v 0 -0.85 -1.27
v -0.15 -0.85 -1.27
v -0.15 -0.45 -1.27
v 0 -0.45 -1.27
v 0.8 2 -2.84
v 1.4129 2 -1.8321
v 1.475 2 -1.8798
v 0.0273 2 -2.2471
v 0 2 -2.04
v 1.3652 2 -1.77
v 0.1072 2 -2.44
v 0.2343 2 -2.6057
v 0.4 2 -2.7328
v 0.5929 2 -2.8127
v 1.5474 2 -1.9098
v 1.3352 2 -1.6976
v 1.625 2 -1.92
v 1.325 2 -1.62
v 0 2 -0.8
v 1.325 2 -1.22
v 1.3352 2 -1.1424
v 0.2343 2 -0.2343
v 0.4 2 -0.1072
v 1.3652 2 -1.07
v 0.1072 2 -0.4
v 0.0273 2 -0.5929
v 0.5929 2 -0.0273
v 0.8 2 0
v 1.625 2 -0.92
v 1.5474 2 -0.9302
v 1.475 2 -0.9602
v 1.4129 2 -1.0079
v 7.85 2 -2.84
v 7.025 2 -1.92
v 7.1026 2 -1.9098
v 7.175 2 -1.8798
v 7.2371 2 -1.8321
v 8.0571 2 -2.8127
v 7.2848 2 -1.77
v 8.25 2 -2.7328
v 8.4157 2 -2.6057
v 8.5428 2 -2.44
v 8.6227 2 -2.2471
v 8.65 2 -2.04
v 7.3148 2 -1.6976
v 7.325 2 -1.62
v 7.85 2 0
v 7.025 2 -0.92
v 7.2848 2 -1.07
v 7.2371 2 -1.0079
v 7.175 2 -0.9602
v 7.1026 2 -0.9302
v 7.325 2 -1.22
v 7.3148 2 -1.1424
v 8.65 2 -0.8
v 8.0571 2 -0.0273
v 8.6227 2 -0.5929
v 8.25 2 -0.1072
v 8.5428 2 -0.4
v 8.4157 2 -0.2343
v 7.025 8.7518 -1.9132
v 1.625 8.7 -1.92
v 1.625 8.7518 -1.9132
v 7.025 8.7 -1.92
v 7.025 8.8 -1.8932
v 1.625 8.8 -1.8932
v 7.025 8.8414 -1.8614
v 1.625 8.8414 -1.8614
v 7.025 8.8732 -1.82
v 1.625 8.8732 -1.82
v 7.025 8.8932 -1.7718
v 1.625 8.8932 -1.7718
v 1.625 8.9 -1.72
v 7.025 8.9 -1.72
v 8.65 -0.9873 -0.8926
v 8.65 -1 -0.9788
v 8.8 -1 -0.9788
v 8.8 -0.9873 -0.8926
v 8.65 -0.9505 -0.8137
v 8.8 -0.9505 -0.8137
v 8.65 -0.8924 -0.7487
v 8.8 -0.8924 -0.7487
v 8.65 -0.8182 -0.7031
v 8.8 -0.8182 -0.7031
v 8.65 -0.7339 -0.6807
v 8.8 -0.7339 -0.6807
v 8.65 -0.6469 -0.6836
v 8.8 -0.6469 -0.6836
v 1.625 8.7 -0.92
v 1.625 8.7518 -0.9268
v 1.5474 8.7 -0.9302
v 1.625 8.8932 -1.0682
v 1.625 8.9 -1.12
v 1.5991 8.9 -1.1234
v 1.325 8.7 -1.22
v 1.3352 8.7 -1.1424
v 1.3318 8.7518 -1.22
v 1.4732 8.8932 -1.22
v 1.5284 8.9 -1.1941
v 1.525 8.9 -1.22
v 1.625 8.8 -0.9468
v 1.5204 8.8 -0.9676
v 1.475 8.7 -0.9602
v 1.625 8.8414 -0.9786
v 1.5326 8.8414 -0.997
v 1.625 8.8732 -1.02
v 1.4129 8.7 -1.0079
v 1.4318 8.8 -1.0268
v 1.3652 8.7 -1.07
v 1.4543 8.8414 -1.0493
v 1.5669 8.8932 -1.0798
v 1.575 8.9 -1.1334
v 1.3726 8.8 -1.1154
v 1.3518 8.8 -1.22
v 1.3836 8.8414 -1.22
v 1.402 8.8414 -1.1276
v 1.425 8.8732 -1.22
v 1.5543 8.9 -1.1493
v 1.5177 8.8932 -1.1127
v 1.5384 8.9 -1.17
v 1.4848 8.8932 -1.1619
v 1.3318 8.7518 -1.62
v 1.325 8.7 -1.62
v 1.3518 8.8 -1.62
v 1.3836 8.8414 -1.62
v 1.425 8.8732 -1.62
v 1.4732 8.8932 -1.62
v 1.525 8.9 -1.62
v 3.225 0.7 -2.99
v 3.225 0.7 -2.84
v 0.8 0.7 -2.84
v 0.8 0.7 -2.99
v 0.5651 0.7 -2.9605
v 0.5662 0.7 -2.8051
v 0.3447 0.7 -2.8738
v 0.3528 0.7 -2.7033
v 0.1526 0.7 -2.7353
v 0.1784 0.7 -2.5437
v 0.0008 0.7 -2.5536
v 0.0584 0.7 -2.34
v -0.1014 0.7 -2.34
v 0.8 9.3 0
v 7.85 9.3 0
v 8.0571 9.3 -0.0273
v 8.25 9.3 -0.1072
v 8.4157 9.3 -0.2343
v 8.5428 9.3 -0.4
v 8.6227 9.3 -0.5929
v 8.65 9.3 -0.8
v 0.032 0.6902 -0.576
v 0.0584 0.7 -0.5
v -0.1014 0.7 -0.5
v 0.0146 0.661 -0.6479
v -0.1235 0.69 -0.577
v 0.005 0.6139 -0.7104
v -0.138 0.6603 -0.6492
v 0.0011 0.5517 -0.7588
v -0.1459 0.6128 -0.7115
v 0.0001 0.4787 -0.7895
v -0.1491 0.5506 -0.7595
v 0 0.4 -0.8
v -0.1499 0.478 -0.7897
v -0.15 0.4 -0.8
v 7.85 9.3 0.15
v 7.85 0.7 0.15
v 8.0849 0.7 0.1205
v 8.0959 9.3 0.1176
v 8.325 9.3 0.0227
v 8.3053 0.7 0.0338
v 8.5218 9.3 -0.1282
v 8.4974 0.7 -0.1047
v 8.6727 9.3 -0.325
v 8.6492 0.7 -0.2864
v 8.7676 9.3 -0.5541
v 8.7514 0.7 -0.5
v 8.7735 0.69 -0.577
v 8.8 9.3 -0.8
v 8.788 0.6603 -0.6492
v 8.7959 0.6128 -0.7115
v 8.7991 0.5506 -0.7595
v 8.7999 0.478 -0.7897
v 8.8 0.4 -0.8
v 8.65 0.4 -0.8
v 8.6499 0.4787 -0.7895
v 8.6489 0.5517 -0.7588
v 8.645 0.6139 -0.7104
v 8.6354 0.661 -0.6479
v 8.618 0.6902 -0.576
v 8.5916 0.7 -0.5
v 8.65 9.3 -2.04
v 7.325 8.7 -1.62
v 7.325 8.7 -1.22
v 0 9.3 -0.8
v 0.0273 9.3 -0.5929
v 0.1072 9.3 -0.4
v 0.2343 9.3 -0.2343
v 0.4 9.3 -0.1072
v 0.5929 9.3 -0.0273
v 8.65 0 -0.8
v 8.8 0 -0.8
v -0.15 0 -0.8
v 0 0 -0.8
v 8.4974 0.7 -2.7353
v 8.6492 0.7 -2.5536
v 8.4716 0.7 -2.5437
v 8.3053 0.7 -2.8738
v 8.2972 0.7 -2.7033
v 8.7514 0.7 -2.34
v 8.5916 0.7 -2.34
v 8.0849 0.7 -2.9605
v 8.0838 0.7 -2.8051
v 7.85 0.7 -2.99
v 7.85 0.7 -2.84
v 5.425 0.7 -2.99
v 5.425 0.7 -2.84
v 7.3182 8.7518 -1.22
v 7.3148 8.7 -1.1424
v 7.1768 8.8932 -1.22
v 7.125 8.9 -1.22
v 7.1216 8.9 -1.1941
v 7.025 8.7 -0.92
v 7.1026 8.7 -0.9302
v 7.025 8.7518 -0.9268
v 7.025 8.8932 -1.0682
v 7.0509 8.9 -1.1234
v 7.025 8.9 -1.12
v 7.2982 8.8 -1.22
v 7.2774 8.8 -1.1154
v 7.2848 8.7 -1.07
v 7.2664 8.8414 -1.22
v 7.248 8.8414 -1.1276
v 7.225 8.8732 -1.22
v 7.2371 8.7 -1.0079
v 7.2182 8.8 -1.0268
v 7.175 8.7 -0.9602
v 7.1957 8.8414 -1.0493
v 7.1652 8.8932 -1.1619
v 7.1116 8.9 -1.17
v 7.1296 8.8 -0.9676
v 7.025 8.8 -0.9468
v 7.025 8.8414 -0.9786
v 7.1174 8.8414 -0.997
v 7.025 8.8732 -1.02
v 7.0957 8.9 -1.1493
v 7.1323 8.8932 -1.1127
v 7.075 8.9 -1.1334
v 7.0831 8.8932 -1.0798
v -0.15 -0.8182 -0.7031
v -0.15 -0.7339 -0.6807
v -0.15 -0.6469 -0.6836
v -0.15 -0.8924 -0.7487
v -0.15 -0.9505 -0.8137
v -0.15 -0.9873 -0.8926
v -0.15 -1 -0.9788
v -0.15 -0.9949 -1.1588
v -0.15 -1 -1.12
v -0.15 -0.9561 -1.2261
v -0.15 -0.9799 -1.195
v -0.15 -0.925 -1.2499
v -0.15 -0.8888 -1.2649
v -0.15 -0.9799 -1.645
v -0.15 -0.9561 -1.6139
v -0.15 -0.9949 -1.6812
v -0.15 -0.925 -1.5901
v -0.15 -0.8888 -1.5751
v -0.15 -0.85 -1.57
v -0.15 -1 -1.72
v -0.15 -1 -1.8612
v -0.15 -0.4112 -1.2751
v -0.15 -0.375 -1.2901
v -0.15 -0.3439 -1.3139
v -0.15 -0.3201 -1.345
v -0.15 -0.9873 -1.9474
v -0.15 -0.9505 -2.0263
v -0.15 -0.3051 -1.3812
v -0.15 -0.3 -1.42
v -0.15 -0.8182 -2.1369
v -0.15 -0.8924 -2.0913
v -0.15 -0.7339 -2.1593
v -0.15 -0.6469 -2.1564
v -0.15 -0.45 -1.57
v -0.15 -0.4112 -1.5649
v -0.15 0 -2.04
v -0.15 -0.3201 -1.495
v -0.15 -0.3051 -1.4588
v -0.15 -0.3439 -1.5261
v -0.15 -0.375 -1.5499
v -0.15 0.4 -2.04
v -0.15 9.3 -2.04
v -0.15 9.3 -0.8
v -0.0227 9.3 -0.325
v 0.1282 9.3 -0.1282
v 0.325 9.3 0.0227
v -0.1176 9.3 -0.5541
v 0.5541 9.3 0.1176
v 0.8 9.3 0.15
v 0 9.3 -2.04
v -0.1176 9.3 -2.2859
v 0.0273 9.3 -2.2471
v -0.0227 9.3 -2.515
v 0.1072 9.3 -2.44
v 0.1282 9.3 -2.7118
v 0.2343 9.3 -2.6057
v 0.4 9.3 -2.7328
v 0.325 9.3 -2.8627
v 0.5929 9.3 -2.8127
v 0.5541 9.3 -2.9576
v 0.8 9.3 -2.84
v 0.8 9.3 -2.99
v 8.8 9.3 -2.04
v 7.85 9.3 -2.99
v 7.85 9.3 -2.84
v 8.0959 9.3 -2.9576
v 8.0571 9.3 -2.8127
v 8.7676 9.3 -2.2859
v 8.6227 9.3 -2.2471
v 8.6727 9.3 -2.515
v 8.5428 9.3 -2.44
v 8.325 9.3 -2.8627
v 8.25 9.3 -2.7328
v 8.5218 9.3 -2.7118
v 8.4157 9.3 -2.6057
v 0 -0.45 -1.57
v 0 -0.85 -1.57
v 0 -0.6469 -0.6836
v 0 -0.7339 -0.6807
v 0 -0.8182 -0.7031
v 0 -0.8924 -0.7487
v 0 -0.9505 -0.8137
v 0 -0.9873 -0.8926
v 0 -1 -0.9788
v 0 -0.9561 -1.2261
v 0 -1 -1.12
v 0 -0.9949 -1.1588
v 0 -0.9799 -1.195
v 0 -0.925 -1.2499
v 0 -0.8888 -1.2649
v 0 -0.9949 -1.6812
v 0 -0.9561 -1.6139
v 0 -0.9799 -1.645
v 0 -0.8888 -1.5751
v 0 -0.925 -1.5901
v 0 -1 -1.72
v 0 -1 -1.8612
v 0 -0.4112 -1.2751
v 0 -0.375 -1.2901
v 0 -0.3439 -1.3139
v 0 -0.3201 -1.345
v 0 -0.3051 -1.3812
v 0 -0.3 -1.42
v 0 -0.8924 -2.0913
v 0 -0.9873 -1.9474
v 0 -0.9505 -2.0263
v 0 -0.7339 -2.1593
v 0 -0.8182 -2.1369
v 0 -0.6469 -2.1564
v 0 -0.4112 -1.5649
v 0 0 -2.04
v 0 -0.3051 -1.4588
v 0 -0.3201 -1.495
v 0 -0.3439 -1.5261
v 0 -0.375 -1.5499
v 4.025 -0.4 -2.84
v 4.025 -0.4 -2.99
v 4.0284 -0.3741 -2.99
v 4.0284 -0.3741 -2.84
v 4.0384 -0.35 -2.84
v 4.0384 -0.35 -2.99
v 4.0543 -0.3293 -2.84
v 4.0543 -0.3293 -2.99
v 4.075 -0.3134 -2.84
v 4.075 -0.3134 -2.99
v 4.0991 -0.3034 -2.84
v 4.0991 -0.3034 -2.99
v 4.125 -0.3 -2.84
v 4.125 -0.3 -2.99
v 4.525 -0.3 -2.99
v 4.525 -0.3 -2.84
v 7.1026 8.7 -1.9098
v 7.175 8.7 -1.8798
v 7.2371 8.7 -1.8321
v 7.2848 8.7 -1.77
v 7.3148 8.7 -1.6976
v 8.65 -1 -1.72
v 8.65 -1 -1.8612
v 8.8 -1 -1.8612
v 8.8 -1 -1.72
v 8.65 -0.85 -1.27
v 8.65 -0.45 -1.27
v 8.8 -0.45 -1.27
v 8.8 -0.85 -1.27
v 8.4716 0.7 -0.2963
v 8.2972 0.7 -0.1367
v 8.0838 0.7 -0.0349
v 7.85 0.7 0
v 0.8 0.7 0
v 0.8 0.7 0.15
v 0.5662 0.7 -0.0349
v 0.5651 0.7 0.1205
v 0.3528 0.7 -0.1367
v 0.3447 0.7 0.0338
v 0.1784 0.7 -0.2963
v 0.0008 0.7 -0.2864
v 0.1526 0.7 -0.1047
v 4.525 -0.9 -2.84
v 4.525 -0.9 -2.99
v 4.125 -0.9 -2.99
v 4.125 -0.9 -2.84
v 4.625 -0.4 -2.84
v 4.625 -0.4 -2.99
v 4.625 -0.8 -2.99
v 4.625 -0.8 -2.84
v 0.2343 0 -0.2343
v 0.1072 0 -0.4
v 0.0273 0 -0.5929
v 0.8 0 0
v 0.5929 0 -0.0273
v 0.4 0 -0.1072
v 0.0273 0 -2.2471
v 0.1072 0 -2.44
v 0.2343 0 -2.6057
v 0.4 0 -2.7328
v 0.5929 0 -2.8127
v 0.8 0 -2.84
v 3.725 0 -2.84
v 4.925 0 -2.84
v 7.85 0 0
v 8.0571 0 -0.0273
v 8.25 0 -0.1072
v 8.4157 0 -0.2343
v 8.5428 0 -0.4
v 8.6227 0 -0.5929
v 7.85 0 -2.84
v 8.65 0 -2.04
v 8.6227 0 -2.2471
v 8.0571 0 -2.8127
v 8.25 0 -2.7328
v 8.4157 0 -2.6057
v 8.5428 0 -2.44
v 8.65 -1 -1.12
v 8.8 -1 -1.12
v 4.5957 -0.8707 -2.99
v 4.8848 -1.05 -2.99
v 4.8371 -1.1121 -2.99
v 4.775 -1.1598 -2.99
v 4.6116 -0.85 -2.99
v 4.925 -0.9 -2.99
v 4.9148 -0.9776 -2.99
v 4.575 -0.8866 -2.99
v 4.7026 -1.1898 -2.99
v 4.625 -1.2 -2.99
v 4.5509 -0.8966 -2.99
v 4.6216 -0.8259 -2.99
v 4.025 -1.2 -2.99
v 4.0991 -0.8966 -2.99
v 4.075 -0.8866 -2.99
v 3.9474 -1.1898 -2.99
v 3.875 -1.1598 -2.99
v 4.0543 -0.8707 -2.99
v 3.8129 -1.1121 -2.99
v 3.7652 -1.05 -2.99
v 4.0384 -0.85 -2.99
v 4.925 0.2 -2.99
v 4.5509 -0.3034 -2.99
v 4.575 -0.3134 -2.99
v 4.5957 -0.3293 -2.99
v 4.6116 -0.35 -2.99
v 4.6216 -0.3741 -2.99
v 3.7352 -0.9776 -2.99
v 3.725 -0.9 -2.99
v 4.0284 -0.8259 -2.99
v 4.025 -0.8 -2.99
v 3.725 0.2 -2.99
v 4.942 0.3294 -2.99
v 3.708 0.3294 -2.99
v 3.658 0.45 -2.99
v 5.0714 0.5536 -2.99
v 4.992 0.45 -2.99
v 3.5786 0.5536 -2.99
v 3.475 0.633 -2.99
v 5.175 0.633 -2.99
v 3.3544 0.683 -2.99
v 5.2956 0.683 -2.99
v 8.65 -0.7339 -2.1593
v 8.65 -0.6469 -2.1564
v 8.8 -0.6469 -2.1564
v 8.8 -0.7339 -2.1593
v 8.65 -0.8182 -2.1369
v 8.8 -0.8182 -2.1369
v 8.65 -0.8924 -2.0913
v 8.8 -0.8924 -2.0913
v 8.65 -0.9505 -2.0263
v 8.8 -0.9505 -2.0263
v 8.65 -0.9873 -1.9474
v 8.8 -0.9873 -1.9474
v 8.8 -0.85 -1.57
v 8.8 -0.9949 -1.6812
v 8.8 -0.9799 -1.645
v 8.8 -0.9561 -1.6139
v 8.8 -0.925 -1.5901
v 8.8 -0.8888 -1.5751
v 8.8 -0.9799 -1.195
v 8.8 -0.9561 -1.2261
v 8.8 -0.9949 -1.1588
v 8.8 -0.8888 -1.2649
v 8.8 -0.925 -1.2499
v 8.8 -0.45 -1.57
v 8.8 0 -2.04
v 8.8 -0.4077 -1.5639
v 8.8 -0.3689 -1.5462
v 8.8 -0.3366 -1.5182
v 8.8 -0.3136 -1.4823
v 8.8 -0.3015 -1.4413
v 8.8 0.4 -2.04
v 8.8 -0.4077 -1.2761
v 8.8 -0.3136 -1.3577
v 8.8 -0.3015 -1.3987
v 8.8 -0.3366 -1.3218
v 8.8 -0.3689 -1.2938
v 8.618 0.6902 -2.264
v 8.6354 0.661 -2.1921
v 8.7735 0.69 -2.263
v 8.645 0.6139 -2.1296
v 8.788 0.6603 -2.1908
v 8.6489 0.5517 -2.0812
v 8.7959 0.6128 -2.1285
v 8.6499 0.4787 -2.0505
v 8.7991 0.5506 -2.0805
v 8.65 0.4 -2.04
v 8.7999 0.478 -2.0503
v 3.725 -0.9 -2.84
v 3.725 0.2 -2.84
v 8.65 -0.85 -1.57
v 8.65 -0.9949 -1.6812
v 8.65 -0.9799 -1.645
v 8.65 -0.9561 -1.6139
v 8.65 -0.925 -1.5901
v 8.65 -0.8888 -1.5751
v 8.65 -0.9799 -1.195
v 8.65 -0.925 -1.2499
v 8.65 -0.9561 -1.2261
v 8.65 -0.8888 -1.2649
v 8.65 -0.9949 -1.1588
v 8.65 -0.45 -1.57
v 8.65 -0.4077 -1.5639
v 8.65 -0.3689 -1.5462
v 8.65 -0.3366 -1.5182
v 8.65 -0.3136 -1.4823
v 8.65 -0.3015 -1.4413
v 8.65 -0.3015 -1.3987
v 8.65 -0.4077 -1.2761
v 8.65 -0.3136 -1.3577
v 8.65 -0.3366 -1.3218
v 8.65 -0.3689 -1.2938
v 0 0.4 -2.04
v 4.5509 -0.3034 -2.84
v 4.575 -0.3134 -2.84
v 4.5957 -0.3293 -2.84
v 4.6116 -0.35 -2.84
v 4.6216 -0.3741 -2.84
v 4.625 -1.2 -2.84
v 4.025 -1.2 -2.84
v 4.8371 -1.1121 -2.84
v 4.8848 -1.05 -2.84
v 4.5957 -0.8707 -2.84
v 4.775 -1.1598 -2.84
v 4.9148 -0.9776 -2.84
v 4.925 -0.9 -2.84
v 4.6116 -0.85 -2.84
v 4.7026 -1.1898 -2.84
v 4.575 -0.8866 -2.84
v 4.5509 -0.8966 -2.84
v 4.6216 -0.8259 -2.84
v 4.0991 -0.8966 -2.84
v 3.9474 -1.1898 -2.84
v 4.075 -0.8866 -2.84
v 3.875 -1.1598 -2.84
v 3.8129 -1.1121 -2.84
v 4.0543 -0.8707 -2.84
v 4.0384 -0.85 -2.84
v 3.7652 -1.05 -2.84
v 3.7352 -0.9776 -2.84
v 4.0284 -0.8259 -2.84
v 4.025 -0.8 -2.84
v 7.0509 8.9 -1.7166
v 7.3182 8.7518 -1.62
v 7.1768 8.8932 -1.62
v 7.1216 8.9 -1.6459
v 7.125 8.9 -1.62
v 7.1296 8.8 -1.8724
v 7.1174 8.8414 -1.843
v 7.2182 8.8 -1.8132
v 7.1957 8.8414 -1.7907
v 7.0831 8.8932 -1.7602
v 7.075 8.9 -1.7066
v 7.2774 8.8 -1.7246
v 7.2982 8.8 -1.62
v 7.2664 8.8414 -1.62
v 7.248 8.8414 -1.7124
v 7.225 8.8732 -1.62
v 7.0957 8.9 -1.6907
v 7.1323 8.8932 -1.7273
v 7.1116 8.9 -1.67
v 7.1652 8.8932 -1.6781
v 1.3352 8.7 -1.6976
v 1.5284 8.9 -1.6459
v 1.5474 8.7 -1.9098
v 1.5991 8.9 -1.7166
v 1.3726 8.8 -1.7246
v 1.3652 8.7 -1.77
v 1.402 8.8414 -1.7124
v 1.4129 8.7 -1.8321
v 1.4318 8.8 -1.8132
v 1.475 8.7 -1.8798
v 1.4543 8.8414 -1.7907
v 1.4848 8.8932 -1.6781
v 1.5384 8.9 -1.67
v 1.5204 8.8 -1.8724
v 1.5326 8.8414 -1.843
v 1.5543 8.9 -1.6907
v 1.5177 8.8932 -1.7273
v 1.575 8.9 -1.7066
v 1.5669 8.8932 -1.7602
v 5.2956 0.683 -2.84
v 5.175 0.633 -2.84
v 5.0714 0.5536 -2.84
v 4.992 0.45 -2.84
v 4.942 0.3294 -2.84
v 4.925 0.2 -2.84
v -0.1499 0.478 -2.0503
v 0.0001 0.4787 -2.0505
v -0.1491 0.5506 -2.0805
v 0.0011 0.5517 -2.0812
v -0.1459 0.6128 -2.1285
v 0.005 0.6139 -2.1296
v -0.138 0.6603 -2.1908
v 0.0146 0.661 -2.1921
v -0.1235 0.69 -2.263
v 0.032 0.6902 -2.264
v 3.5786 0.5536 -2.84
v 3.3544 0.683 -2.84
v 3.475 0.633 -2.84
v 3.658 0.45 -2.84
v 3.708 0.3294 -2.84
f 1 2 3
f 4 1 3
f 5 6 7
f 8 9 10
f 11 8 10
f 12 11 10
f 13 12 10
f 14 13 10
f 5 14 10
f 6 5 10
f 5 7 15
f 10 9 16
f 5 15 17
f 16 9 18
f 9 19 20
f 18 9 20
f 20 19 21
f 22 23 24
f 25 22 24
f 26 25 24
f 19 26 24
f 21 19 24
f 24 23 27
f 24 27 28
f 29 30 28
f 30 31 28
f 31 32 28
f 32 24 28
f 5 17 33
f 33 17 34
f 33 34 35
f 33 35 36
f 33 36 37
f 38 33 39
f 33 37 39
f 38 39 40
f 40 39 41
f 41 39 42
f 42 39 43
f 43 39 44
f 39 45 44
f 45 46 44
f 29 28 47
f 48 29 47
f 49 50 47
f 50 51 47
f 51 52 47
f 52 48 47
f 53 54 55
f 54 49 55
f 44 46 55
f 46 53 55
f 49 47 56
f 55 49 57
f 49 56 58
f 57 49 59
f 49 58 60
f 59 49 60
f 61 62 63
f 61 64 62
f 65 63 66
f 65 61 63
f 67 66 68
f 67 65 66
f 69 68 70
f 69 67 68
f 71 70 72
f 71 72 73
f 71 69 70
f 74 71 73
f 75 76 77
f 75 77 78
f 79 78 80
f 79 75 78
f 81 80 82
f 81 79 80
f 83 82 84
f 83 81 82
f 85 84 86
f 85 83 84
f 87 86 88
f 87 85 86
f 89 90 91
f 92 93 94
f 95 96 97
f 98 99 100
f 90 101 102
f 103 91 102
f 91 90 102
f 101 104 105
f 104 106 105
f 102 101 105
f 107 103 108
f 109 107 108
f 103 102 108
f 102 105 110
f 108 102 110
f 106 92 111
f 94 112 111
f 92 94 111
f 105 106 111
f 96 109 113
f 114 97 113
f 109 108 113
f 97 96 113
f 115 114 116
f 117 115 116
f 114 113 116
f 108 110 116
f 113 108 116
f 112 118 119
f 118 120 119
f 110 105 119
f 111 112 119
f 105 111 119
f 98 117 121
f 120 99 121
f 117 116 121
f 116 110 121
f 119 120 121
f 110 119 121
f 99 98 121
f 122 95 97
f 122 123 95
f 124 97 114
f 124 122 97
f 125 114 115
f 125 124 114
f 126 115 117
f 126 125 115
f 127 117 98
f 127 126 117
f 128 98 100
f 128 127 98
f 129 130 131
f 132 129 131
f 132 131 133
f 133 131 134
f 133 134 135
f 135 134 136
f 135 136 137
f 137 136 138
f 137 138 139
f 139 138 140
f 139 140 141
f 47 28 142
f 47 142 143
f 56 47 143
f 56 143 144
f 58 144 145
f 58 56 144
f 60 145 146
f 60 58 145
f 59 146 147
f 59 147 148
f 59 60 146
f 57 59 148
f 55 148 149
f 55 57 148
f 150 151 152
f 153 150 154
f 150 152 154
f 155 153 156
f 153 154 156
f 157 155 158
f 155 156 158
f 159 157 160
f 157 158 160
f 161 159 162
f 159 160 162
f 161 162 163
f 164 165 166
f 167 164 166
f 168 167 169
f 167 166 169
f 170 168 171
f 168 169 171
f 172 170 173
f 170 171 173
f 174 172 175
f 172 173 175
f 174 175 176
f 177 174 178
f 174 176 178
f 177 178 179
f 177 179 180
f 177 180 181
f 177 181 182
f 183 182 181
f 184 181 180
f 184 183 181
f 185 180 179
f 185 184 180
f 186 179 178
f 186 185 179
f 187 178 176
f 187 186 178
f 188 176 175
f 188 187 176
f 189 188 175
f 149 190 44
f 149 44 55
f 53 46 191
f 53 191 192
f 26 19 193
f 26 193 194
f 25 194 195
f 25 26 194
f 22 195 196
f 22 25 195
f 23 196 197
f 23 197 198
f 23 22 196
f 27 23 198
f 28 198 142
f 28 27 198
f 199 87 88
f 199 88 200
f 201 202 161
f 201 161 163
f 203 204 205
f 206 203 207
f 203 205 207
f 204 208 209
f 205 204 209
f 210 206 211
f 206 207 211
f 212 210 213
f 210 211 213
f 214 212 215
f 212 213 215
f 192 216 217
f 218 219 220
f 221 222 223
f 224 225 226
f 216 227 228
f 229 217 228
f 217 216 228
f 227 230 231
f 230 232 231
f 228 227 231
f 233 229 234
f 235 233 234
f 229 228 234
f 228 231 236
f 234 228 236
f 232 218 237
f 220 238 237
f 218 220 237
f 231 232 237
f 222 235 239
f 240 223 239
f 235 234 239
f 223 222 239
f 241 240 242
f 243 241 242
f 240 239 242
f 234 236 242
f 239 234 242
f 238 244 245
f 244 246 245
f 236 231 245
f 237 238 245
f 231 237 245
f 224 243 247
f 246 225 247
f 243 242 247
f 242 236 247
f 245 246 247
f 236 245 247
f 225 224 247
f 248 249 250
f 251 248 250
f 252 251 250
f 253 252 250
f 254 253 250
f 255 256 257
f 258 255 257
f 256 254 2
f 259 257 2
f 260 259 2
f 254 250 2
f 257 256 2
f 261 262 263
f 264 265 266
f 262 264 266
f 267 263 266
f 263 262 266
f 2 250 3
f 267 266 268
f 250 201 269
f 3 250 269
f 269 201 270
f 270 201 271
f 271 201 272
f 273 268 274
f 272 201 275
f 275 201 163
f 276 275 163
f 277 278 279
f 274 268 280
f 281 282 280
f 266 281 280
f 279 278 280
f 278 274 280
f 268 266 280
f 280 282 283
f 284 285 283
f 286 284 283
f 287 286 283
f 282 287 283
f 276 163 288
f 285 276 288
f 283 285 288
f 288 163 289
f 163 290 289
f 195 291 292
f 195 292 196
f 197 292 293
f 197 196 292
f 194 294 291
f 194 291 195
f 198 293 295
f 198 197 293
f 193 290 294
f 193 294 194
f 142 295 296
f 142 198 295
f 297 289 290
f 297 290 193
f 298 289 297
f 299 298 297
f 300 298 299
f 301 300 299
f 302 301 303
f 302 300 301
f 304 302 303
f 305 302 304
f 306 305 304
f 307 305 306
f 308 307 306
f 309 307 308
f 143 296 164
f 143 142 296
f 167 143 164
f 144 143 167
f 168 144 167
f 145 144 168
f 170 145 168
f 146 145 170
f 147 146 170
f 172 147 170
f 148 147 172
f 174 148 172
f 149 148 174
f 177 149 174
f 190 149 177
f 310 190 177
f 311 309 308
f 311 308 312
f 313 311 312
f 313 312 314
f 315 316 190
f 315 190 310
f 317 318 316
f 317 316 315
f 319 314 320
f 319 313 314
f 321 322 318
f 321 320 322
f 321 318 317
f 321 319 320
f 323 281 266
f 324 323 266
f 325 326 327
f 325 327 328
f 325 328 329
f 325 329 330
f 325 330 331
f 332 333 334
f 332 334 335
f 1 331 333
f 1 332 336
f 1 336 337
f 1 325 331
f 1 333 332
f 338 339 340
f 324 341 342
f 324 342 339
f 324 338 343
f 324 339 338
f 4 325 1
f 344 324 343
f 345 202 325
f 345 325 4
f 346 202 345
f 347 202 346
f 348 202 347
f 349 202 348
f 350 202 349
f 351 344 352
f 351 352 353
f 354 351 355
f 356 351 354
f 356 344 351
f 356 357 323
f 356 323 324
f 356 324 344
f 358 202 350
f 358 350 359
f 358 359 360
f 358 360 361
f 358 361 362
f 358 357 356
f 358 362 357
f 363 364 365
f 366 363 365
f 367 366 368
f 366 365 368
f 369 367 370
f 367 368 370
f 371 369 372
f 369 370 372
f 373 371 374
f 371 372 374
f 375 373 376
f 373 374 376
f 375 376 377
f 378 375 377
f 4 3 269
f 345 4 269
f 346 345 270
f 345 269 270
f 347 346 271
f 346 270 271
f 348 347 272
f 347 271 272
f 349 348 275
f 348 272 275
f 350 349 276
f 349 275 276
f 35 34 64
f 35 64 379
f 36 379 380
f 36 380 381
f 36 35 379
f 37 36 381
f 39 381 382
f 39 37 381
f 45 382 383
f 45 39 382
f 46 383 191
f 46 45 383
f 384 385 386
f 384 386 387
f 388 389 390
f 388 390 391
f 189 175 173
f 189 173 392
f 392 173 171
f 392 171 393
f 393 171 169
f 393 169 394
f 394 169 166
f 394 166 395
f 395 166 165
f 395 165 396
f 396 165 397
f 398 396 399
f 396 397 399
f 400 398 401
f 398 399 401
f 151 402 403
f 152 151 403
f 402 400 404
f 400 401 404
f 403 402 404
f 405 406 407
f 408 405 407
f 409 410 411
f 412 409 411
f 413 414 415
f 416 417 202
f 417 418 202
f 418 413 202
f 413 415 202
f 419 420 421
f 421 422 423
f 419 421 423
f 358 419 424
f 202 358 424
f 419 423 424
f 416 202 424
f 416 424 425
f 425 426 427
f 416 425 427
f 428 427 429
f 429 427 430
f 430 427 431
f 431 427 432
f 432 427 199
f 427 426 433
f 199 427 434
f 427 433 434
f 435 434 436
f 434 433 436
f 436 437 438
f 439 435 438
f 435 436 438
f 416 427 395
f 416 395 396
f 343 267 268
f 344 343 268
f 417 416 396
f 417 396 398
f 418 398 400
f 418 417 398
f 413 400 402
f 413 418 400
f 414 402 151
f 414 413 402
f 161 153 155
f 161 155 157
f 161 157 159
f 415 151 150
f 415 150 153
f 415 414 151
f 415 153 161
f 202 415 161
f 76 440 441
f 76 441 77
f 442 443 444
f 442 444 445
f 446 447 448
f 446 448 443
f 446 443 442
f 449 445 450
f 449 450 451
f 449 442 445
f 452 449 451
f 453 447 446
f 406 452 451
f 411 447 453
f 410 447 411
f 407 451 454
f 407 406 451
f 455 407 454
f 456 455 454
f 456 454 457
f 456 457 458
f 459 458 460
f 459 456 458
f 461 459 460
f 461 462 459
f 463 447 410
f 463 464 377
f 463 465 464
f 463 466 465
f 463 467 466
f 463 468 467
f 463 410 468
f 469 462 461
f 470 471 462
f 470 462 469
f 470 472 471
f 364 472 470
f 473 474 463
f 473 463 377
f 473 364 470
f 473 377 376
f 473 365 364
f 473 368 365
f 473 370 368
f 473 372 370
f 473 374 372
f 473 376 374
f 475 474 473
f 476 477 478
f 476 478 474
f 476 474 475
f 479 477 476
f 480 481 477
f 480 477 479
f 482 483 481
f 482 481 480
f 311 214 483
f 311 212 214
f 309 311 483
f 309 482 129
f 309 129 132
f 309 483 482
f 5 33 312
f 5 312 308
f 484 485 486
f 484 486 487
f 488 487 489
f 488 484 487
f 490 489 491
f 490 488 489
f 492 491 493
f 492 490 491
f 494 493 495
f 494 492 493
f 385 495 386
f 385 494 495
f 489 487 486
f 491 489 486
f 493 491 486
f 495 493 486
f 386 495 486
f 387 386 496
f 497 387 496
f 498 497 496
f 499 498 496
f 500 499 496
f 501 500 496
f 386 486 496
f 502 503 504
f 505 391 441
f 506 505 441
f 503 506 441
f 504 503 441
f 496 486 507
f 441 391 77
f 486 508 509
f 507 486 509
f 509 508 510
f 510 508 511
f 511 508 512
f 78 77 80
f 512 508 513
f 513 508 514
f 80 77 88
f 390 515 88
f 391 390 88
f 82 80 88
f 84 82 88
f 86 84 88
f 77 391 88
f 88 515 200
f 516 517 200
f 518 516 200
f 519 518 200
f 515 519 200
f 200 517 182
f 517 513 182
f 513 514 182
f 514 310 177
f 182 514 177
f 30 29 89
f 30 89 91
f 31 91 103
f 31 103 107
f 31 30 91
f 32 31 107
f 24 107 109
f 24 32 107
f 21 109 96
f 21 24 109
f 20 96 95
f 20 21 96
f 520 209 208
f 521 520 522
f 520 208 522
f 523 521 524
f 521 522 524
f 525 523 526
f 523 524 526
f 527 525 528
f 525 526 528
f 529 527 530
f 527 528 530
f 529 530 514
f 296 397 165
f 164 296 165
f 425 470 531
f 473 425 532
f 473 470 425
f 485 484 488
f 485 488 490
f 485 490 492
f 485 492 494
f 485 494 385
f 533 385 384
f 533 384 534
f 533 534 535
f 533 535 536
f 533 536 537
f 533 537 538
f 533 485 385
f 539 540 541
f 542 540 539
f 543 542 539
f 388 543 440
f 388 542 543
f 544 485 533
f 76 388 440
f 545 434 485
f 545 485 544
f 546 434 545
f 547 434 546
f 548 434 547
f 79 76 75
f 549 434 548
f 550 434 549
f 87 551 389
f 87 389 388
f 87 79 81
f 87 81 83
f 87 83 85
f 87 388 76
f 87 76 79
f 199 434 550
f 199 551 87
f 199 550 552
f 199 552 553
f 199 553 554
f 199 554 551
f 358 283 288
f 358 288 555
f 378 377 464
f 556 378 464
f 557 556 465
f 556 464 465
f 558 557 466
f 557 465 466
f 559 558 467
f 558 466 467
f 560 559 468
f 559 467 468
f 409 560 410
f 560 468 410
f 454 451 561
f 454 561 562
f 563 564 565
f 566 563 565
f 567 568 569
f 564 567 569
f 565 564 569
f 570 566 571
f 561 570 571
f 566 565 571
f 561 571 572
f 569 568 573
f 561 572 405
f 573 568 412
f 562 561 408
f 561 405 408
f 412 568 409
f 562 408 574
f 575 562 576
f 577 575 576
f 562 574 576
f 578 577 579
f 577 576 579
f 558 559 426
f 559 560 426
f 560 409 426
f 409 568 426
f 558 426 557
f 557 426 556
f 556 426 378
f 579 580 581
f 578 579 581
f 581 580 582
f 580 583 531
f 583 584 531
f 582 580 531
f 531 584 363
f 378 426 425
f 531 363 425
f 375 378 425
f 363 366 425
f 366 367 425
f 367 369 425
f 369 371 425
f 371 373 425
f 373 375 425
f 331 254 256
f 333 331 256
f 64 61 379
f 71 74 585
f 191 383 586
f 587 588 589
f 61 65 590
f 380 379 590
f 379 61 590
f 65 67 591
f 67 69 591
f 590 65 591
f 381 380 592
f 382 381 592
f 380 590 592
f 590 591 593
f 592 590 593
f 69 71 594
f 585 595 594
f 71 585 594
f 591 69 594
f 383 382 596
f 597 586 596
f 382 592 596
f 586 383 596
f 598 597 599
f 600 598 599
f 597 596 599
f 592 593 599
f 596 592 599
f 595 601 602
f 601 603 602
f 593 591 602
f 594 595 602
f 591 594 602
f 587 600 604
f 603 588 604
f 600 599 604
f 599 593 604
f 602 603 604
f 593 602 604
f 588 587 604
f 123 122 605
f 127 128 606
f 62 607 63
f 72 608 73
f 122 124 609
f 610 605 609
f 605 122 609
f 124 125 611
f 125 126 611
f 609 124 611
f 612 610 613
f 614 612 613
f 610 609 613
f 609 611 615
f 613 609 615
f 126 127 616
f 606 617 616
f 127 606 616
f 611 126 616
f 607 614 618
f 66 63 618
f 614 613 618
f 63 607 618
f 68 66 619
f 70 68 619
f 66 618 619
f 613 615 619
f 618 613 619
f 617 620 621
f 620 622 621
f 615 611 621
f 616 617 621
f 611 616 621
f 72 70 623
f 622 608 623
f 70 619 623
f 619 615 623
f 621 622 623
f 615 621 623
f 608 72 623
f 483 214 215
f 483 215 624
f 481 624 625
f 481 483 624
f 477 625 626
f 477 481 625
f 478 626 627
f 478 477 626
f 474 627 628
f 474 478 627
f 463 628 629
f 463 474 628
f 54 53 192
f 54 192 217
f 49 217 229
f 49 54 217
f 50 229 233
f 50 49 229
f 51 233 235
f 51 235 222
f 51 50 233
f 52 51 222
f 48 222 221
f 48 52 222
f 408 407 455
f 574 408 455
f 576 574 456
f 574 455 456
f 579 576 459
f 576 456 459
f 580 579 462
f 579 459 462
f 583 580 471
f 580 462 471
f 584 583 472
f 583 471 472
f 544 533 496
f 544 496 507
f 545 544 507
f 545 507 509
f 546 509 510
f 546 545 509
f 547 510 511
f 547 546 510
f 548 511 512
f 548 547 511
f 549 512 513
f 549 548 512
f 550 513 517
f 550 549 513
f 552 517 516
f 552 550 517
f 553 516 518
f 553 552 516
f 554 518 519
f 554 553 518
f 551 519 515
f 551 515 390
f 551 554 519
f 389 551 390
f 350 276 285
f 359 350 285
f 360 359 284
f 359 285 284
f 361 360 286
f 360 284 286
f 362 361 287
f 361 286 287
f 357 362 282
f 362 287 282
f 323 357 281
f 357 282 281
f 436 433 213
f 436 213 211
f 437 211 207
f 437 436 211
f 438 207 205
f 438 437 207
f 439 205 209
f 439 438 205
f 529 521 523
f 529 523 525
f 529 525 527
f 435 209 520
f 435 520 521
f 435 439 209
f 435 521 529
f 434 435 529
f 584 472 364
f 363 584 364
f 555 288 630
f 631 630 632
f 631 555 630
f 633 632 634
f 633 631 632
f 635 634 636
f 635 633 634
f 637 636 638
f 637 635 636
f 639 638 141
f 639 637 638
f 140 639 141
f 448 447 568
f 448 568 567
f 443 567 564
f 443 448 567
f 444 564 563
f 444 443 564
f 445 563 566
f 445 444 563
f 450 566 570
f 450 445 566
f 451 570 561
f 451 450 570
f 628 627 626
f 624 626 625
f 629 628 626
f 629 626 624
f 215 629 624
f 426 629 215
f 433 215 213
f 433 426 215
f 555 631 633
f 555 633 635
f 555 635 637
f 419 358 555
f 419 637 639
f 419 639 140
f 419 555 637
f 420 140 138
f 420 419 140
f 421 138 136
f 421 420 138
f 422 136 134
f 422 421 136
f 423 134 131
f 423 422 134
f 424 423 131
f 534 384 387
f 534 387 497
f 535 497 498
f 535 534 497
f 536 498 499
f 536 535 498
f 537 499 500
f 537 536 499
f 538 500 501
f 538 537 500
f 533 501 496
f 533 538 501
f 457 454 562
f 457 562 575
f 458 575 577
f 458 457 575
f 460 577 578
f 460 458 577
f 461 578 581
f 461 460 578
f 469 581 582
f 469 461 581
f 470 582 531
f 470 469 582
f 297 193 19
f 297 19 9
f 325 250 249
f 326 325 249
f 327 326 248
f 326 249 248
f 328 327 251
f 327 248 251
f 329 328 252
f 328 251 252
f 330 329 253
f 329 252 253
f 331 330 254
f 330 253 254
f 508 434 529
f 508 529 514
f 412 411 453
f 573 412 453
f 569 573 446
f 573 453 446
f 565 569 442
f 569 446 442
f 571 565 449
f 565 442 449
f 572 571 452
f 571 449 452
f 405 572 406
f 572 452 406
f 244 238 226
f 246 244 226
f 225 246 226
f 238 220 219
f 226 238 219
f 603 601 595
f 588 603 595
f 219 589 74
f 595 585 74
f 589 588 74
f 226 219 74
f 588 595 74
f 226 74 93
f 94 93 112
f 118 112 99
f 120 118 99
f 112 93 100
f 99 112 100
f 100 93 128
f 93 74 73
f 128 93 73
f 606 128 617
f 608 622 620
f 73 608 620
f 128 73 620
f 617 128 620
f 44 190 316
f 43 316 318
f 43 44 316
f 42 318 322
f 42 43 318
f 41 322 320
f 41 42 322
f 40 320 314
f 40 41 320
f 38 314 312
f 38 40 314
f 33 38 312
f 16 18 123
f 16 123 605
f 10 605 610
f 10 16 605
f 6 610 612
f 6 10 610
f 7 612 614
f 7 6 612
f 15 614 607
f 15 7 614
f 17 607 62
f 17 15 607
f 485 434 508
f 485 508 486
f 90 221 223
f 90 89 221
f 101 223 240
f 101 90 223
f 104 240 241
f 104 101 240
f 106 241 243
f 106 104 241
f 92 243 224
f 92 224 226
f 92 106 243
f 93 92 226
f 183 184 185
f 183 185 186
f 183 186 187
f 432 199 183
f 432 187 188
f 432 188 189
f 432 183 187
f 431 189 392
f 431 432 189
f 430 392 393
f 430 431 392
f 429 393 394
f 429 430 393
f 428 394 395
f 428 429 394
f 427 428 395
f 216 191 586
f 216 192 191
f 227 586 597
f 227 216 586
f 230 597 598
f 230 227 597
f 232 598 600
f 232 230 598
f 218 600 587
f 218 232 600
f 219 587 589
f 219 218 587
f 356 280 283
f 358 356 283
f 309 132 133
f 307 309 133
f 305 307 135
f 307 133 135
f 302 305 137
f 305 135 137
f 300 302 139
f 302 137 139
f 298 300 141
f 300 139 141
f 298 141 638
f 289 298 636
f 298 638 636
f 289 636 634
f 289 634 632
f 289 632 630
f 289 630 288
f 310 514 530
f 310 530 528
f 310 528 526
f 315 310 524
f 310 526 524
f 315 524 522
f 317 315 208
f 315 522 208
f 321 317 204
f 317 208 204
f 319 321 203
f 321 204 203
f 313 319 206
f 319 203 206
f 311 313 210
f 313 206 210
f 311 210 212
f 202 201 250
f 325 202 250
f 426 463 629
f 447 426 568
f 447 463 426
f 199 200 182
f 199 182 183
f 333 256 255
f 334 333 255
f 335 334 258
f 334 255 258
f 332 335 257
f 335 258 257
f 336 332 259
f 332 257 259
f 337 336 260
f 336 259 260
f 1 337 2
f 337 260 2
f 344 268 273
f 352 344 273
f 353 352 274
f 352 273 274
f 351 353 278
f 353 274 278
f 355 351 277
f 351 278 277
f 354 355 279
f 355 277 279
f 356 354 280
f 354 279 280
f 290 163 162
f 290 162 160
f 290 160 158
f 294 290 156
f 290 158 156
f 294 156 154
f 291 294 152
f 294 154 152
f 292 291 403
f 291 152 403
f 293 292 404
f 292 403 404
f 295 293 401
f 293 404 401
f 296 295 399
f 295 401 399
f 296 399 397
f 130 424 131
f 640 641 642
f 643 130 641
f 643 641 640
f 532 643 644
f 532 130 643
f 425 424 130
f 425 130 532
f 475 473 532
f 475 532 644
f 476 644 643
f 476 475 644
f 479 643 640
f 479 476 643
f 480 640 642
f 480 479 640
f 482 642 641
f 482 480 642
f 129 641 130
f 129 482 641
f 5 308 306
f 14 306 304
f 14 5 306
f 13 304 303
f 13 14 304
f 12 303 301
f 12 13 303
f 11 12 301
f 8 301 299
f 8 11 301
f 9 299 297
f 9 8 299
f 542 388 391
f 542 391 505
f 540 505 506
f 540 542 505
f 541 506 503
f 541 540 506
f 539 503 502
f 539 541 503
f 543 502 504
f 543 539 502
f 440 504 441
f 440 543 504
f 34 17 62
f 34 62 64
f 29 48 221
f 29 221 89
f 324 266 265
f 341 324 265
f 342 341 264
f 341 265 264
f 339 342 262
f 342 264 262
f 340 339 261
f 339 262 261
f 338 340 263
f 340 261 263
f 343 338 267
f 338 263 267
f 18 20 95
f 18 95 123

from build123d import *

# Parameters (mm, degrees)
EXTRUDE_1_DEPTH     = 9.3
EXTRUDE_2_DEPTH     = 0.15
EXTRUDE_START       = -0.15
EXTRUDE_3_DEPTH     = 0.15
EXTRUDE_4_DEPTH     = 2
CUT_EXTRUDE_1_DEPTH = 0.7
FILLET_1_R          = 0.3
EXTRUDE_5_DEPTH     = 0.15
CUT_EXTRUDE_2_DEPTH = 0.15
EXTRUDE_6_DEPTH     = 6.9
FILLET_2_R          = 0.2


with BuildPart() as part:
    # 草图1 → 凸台-拉伸1 (new body)
    with BuildSketch(Plane(origin=(0, 0, 0), x_dir=(1, 0, 0), z_dir=(0, 1, 0))):
        with BuildLine():
            Line((0.8, -0.15), (7.85, -0.15))
            ThreePointArc((7.85, -0.15), (8.521751442, 0.128248558), (8.8, 0.8))
            Line((8.8, 0.8), (8.8, 2.04))
            ThreePointArc((8.8, 2.04), (8.521751442, 2.711751442), (7.85, 2.99))
            Line((7.85, 2.99), (0.8, 2.99))
            ThreePointArc((0.8, 2.99), (0.128248558, 2.711751442), (-0.15, 2.04))
            Line((-0.15, 2.04), (-0.15, 0.8))
            ThreePointArc((-0.15, 0.8), (0.128248558, 0.128248558), (0.8, -0.15))
        make_face()
        with BuildLine():
            Line((0.8, 0), (7.85, 0))
            ThreePointArc((7.85, 0), (8.415685425, 0.234314575), (8.65, 0.8))
            Line((8.65, 0.8), (8.65, 2.04))
            ThreePointArc((8.65, 2.04), (8.415685425, 2.605685425), (7.85, 2.84))
            Line((7.85, 2.84), (0.8, 2.84))
            ThreePointArc((0.8, 2.84), (0.234314575, 2.605685425), (0, 2.04))
            Line((0, 2.04), (0, 0.8))
            ThreePointArc((0, 0.8), (0.234314575, 0.234314575), (0.8, 0))
        make_face(mode=Mode.SUBTRACT)
    extrude(amount=EXTRUDE_1_DEPTH)

    # 草图3 → 凸台-拉伸2 (add)
    with BuildSketch(Plane.ZY.offset(0.15)):
        with BuildLine():
            Line((-2.04, 0), (-0.8, 0))
            Line((-0.8, 0), (-0.683566262, -0.646854101))
            ThreePointArc((-0.683566262, -0.646854101), (-0.748665041, -0.892426908), (-0.978821259, -1))
            Line((-0.978821259, -1), (-1.12, -1))
            ThreePointArc((-1.12, -1), (-1.226066017, -0.956066017), (-1.27, -0.85))
            Line((-1.27, -0.85), (-1.27, -0.45))
            ThreePointArc((-1.27, -0.45), (-1.313933983, -0.343933983), (-1.42, -0.3))
            ThreePointArc((-1.42, -0.3), (-1.526066017, -0.343933983), (-1.57, -0.45))
            Line((-1.57, -0.45), (-1.57, -0.85))
            ThreePointArc((-1.57, -0.85), (-1.613933983, -0.956066017), (-1.72, -1))
            Line((-1.72, -1), (-1.861178741, -1))
            ThreePointArc((-1.861178741, -1), (-2.091334959, -0.892426908), (-2.156433738, -0.646854101))
            Line((-2.156433738, -0.646854101), (-2.04, 0))
        make_face()
    extrude(amount=-EXTRUDE_2_DEPTH)

    # 草图4 → 凸台-拉伸3 (add)
    with BuildSketch(Plane(origin=(8.8, 0, 0), x_dir=(0, 0, -1), z_dir=(1, 0, 0)).offset(EXTRUDE_START)):
        with BuildLine():
            Line((0.8, 0), (2.04, 0))
            Line((2.04, 0), (2.156433738, -0.646854101))
            ThreePointArc((2.156433738, -0.646854101), (2.091334959, -0.892426908), (1.861178741, -1))
            Line((1.861178741, -1), (1.72, -1))
            ThreePointArc((1.72, -1), (1.613933983, -0.956066017), (1.57, -0.85))
            Line((1.57, -0.85), (1.57, -0.45))
            ThreePointArc((1.57, -0.45), (1.42, -0.3), (1.27, -0.45))
            Line((1.27, -0.45), (1.27, -0.85))
            ThreePointArc((1.27, -0.85), (1.226066017, -0.956066017), (1.12, -1))
            Line((1.12, -1), (0.978821259, -1))
            ThreePointArc((0.978821259, -1), (0.748665041, -0.892426908), (0.683566262, -0.646854101))
            Line((0.683566262, -0.646854101), (0.8, 0))
        make_face()
    extrude(amount=EXTRUDE_3_DEPTH)

    # 草图5 → 凸台-拉伸4 (add)
    with BuildSketch(Plane.XZ):
        with BuildLine():
            Line((0.8, -2.99), (7.85, -2.99))
            ThreePointArc((7.85, -2.99), (8.521751442, -2.711751442), (8.8, -2.04))
            Line((8.8, -2.04), (8.8, -0.8))
            ThreePointArc((8.8, -0.8), (8.521751442, -0.128248558), (7.85, 0.15))
            Line((7.85, 0.15), (0.8, 0.15))
            ThreePointArc((0.8, 0.15), (0.128248558, -0.128248558), (-0.15, -0.8))
            Line((-0.15, -0.8), (-0.15, -2.04))
            ThreePointArc((-0.15, -2.04), (0.128248558, -2.711751442), (0.8, -2.99))
        make_face()
    extrude(amount=-EXTRUDE_4_DEPTH)

    # 草图6 → 切除-拉伸1 (cut)
    with BuildSketch(Plane.XZ):
        with BuildLine():
            Line((0.8, 0.15), (7.85, 0.15))
            ThreePointArc((7.85, 0.15), (8.521751442, -0.128248558), (8.8, -0.8))
            Line((8.8, -0.8), (8.65, -0.8))
            ThreePointArc((8.65, -0.8), (8.415685425, -0.234314575), (7.85, 0))
            Line((7.85, 0), (0.8, 0))
            ThreePointArc((0.8, 0), (0.234314575, -0.234314575), (0, -0.8))
            Line((0, -0.8), (-0.15, -0.8))
            ThreePointArc((-0.15, -0.8), (0.128248558, -0.128248558), (0.8, 0.15))
        make_face()
        with BuildLine():
            Line((7.85, -2.99), (0.8, -2.99))
            ThreePointArc((0.8, -2.99), (0.128248558, -2.711751442), (-0.15, -2.04))
            Line((-0.15, -2.04), (0, -2.04))
            ThreePointArc((0, -2.04), (0.234314575, -2.605685425), (0.8, -2.84))
            Line((0.8, -2.84), (7.85, -2.84))
            ThreePointArc((7.85, -2.84), (8.415685425, -2.605685425), (8.65, -2.04))
            Line((8.65, -2.04), (8.8, -2.04))
            ThreePointArc((8.8, -2.04), (8.521751442, -2.711751442), (7.85, -2.99))
        make_face()
    extrude(amount=-CUT_EXTRUDE_1_DEPTH, mode=Mode.SUBTRACT)

    # 圆角1
    fillet_1_edges = [part.edges().sort_by_distance(p)[0] for p in [
        (8.725, 0.7, -0.8),
        (-0.075, 0.7, -0.8),
        (-0.075, 0.7, -2.04),
        (8.725, 0.7, -2.04),
    ]]
    fillet(fillet_1_edges, radius=FILLET_1_R)

    # 草图7 → 凸台-拉伸5 (add)
    with BuildSketch(Plane(origin=(0, 0, -2.99), x_dir=(-1, 0, 0), z_dir=(0, 0, -1))):
        with BuildLine():
            Line((-3.225, 0.7), (-5.425, 0.7))
            ThreePointArc((-5.425, 0.7), (-5.071446609, 0.553553391), (-4.925, 0.2))
            Line((-4.925, 0.2), (-4.925, -0.9))
            ThreePointArc((-4.925, -0.9), (-4.837132034, -1.112132034), (-4.625, -1.2))
            Line((-4.625, -1.2), (-4.325, -1.2))
            Line((-4.325, -1.2), (-4.025, -1.2))
            ThreePointArc((-4.025, -1.2), (-3.812867966, -1.112132034), (-3.725, -0.9))
            Line((-3.725, -0.9), (-3.725, 0.2))
            ThreePointArc((-3.725, 0.2), (-3.578553391, 0.553553391), (-3.225, 0.7))
        make_face()
    extrude(amount=-EXTRUDE_5_DEPTH)

    # 草图8 → 切除-拉伸2 (cut)
    with BuildSketch(Plane(origin=(0, 0, -2.99), x_dir=(-1, 0, 0), z_dir=(0, 0, -1))):
        with BuildLine():
            Line((-4.325, -0.9), (-4.125, -0.9))
            ThreePointArc((-4.125, -0.9), (-4.054289322, -0.870710678), (-4.025, -0.8))
            Line((-4.025, -0.8), (-4.025, -0.4))
            ThreePointArc((-4.025, -0.4), (-4.054289322, -0.329289322), (-4.125, -0.3))
            Line((-4.125, -0.3), (-4.525, -0.3))
            ThreePointArc((-4.525, -0.3), (-4.595710678, -0.329289322), (-4.625, -0.4))
            Line((-4.625, -0.4), (-4.625, -0.8))
            ThreePointArc((-4.625, -0.8), (-4.595710678, -0.870710678), (-4.525, -0.9))
            Line((-4.525, -0.9), (-4.325, -0.9))
        make_face()
    extrude(amount=-CUT_EXTRUDE_2_DEPTH, mode=Mode.SUBTRACT)

    # 草图9 → 凸台-拉伸6 (add)
    with BuildSketch(Plane(origin=(0, 2, 0), x_dir=(1, 0, 0), z_dir=(0, 1, 0))):
        with BuildLine():
            Line((1.325, 1.42), (1.325, 1.62))
            ThreePointArc((1.325, 1.62), (1.412867966, 1.832132034), (1.625, 1.92))
            Line((1.625, 1.92), (7.025, 1.92))
            ThreePointArc((7.025, 1.92), (7.237132034, 1.832132034), (7.325, 1.62))
            Line((7.325, 1.62), (7.325, 1.22))
            ThreePointArc((7.325, 1.22), (7.237132034, 1.007867966), (7.025, 0.92))
            Line((7.025, 0.92), (1.625, 0.92))
            ThreePointArc((1.625, 0.92), (1.412867966, 1.007867966), (1.325, 1.22))
            Line((1.325, 1.22), (1.325, 1.42))
        make_face()
    extrude(amount=EXTRUDE_6_DEPTH)

    # 圆角2
    fillet_2_edges = [part.edges().sort_by_distance(p)[0] for p in [
        (7.325, 8.9, -1.42),
        (7.237132034, 8.9, -1.007867966),
        (4.325, 8.9, -0.92),
        (1.412867966, 8.9, -1.007867966),
        (1.325, 8.9, -1.42),
        (1.412867966, 8.9, -1.832132034),
        (4.325, 8.9, -1.92),
        (7.237132034, 8.9, -1.832132034),
    ]]
    fillet(fillet_2_edges, radius=FILLET_2_R)


solid = part.part
